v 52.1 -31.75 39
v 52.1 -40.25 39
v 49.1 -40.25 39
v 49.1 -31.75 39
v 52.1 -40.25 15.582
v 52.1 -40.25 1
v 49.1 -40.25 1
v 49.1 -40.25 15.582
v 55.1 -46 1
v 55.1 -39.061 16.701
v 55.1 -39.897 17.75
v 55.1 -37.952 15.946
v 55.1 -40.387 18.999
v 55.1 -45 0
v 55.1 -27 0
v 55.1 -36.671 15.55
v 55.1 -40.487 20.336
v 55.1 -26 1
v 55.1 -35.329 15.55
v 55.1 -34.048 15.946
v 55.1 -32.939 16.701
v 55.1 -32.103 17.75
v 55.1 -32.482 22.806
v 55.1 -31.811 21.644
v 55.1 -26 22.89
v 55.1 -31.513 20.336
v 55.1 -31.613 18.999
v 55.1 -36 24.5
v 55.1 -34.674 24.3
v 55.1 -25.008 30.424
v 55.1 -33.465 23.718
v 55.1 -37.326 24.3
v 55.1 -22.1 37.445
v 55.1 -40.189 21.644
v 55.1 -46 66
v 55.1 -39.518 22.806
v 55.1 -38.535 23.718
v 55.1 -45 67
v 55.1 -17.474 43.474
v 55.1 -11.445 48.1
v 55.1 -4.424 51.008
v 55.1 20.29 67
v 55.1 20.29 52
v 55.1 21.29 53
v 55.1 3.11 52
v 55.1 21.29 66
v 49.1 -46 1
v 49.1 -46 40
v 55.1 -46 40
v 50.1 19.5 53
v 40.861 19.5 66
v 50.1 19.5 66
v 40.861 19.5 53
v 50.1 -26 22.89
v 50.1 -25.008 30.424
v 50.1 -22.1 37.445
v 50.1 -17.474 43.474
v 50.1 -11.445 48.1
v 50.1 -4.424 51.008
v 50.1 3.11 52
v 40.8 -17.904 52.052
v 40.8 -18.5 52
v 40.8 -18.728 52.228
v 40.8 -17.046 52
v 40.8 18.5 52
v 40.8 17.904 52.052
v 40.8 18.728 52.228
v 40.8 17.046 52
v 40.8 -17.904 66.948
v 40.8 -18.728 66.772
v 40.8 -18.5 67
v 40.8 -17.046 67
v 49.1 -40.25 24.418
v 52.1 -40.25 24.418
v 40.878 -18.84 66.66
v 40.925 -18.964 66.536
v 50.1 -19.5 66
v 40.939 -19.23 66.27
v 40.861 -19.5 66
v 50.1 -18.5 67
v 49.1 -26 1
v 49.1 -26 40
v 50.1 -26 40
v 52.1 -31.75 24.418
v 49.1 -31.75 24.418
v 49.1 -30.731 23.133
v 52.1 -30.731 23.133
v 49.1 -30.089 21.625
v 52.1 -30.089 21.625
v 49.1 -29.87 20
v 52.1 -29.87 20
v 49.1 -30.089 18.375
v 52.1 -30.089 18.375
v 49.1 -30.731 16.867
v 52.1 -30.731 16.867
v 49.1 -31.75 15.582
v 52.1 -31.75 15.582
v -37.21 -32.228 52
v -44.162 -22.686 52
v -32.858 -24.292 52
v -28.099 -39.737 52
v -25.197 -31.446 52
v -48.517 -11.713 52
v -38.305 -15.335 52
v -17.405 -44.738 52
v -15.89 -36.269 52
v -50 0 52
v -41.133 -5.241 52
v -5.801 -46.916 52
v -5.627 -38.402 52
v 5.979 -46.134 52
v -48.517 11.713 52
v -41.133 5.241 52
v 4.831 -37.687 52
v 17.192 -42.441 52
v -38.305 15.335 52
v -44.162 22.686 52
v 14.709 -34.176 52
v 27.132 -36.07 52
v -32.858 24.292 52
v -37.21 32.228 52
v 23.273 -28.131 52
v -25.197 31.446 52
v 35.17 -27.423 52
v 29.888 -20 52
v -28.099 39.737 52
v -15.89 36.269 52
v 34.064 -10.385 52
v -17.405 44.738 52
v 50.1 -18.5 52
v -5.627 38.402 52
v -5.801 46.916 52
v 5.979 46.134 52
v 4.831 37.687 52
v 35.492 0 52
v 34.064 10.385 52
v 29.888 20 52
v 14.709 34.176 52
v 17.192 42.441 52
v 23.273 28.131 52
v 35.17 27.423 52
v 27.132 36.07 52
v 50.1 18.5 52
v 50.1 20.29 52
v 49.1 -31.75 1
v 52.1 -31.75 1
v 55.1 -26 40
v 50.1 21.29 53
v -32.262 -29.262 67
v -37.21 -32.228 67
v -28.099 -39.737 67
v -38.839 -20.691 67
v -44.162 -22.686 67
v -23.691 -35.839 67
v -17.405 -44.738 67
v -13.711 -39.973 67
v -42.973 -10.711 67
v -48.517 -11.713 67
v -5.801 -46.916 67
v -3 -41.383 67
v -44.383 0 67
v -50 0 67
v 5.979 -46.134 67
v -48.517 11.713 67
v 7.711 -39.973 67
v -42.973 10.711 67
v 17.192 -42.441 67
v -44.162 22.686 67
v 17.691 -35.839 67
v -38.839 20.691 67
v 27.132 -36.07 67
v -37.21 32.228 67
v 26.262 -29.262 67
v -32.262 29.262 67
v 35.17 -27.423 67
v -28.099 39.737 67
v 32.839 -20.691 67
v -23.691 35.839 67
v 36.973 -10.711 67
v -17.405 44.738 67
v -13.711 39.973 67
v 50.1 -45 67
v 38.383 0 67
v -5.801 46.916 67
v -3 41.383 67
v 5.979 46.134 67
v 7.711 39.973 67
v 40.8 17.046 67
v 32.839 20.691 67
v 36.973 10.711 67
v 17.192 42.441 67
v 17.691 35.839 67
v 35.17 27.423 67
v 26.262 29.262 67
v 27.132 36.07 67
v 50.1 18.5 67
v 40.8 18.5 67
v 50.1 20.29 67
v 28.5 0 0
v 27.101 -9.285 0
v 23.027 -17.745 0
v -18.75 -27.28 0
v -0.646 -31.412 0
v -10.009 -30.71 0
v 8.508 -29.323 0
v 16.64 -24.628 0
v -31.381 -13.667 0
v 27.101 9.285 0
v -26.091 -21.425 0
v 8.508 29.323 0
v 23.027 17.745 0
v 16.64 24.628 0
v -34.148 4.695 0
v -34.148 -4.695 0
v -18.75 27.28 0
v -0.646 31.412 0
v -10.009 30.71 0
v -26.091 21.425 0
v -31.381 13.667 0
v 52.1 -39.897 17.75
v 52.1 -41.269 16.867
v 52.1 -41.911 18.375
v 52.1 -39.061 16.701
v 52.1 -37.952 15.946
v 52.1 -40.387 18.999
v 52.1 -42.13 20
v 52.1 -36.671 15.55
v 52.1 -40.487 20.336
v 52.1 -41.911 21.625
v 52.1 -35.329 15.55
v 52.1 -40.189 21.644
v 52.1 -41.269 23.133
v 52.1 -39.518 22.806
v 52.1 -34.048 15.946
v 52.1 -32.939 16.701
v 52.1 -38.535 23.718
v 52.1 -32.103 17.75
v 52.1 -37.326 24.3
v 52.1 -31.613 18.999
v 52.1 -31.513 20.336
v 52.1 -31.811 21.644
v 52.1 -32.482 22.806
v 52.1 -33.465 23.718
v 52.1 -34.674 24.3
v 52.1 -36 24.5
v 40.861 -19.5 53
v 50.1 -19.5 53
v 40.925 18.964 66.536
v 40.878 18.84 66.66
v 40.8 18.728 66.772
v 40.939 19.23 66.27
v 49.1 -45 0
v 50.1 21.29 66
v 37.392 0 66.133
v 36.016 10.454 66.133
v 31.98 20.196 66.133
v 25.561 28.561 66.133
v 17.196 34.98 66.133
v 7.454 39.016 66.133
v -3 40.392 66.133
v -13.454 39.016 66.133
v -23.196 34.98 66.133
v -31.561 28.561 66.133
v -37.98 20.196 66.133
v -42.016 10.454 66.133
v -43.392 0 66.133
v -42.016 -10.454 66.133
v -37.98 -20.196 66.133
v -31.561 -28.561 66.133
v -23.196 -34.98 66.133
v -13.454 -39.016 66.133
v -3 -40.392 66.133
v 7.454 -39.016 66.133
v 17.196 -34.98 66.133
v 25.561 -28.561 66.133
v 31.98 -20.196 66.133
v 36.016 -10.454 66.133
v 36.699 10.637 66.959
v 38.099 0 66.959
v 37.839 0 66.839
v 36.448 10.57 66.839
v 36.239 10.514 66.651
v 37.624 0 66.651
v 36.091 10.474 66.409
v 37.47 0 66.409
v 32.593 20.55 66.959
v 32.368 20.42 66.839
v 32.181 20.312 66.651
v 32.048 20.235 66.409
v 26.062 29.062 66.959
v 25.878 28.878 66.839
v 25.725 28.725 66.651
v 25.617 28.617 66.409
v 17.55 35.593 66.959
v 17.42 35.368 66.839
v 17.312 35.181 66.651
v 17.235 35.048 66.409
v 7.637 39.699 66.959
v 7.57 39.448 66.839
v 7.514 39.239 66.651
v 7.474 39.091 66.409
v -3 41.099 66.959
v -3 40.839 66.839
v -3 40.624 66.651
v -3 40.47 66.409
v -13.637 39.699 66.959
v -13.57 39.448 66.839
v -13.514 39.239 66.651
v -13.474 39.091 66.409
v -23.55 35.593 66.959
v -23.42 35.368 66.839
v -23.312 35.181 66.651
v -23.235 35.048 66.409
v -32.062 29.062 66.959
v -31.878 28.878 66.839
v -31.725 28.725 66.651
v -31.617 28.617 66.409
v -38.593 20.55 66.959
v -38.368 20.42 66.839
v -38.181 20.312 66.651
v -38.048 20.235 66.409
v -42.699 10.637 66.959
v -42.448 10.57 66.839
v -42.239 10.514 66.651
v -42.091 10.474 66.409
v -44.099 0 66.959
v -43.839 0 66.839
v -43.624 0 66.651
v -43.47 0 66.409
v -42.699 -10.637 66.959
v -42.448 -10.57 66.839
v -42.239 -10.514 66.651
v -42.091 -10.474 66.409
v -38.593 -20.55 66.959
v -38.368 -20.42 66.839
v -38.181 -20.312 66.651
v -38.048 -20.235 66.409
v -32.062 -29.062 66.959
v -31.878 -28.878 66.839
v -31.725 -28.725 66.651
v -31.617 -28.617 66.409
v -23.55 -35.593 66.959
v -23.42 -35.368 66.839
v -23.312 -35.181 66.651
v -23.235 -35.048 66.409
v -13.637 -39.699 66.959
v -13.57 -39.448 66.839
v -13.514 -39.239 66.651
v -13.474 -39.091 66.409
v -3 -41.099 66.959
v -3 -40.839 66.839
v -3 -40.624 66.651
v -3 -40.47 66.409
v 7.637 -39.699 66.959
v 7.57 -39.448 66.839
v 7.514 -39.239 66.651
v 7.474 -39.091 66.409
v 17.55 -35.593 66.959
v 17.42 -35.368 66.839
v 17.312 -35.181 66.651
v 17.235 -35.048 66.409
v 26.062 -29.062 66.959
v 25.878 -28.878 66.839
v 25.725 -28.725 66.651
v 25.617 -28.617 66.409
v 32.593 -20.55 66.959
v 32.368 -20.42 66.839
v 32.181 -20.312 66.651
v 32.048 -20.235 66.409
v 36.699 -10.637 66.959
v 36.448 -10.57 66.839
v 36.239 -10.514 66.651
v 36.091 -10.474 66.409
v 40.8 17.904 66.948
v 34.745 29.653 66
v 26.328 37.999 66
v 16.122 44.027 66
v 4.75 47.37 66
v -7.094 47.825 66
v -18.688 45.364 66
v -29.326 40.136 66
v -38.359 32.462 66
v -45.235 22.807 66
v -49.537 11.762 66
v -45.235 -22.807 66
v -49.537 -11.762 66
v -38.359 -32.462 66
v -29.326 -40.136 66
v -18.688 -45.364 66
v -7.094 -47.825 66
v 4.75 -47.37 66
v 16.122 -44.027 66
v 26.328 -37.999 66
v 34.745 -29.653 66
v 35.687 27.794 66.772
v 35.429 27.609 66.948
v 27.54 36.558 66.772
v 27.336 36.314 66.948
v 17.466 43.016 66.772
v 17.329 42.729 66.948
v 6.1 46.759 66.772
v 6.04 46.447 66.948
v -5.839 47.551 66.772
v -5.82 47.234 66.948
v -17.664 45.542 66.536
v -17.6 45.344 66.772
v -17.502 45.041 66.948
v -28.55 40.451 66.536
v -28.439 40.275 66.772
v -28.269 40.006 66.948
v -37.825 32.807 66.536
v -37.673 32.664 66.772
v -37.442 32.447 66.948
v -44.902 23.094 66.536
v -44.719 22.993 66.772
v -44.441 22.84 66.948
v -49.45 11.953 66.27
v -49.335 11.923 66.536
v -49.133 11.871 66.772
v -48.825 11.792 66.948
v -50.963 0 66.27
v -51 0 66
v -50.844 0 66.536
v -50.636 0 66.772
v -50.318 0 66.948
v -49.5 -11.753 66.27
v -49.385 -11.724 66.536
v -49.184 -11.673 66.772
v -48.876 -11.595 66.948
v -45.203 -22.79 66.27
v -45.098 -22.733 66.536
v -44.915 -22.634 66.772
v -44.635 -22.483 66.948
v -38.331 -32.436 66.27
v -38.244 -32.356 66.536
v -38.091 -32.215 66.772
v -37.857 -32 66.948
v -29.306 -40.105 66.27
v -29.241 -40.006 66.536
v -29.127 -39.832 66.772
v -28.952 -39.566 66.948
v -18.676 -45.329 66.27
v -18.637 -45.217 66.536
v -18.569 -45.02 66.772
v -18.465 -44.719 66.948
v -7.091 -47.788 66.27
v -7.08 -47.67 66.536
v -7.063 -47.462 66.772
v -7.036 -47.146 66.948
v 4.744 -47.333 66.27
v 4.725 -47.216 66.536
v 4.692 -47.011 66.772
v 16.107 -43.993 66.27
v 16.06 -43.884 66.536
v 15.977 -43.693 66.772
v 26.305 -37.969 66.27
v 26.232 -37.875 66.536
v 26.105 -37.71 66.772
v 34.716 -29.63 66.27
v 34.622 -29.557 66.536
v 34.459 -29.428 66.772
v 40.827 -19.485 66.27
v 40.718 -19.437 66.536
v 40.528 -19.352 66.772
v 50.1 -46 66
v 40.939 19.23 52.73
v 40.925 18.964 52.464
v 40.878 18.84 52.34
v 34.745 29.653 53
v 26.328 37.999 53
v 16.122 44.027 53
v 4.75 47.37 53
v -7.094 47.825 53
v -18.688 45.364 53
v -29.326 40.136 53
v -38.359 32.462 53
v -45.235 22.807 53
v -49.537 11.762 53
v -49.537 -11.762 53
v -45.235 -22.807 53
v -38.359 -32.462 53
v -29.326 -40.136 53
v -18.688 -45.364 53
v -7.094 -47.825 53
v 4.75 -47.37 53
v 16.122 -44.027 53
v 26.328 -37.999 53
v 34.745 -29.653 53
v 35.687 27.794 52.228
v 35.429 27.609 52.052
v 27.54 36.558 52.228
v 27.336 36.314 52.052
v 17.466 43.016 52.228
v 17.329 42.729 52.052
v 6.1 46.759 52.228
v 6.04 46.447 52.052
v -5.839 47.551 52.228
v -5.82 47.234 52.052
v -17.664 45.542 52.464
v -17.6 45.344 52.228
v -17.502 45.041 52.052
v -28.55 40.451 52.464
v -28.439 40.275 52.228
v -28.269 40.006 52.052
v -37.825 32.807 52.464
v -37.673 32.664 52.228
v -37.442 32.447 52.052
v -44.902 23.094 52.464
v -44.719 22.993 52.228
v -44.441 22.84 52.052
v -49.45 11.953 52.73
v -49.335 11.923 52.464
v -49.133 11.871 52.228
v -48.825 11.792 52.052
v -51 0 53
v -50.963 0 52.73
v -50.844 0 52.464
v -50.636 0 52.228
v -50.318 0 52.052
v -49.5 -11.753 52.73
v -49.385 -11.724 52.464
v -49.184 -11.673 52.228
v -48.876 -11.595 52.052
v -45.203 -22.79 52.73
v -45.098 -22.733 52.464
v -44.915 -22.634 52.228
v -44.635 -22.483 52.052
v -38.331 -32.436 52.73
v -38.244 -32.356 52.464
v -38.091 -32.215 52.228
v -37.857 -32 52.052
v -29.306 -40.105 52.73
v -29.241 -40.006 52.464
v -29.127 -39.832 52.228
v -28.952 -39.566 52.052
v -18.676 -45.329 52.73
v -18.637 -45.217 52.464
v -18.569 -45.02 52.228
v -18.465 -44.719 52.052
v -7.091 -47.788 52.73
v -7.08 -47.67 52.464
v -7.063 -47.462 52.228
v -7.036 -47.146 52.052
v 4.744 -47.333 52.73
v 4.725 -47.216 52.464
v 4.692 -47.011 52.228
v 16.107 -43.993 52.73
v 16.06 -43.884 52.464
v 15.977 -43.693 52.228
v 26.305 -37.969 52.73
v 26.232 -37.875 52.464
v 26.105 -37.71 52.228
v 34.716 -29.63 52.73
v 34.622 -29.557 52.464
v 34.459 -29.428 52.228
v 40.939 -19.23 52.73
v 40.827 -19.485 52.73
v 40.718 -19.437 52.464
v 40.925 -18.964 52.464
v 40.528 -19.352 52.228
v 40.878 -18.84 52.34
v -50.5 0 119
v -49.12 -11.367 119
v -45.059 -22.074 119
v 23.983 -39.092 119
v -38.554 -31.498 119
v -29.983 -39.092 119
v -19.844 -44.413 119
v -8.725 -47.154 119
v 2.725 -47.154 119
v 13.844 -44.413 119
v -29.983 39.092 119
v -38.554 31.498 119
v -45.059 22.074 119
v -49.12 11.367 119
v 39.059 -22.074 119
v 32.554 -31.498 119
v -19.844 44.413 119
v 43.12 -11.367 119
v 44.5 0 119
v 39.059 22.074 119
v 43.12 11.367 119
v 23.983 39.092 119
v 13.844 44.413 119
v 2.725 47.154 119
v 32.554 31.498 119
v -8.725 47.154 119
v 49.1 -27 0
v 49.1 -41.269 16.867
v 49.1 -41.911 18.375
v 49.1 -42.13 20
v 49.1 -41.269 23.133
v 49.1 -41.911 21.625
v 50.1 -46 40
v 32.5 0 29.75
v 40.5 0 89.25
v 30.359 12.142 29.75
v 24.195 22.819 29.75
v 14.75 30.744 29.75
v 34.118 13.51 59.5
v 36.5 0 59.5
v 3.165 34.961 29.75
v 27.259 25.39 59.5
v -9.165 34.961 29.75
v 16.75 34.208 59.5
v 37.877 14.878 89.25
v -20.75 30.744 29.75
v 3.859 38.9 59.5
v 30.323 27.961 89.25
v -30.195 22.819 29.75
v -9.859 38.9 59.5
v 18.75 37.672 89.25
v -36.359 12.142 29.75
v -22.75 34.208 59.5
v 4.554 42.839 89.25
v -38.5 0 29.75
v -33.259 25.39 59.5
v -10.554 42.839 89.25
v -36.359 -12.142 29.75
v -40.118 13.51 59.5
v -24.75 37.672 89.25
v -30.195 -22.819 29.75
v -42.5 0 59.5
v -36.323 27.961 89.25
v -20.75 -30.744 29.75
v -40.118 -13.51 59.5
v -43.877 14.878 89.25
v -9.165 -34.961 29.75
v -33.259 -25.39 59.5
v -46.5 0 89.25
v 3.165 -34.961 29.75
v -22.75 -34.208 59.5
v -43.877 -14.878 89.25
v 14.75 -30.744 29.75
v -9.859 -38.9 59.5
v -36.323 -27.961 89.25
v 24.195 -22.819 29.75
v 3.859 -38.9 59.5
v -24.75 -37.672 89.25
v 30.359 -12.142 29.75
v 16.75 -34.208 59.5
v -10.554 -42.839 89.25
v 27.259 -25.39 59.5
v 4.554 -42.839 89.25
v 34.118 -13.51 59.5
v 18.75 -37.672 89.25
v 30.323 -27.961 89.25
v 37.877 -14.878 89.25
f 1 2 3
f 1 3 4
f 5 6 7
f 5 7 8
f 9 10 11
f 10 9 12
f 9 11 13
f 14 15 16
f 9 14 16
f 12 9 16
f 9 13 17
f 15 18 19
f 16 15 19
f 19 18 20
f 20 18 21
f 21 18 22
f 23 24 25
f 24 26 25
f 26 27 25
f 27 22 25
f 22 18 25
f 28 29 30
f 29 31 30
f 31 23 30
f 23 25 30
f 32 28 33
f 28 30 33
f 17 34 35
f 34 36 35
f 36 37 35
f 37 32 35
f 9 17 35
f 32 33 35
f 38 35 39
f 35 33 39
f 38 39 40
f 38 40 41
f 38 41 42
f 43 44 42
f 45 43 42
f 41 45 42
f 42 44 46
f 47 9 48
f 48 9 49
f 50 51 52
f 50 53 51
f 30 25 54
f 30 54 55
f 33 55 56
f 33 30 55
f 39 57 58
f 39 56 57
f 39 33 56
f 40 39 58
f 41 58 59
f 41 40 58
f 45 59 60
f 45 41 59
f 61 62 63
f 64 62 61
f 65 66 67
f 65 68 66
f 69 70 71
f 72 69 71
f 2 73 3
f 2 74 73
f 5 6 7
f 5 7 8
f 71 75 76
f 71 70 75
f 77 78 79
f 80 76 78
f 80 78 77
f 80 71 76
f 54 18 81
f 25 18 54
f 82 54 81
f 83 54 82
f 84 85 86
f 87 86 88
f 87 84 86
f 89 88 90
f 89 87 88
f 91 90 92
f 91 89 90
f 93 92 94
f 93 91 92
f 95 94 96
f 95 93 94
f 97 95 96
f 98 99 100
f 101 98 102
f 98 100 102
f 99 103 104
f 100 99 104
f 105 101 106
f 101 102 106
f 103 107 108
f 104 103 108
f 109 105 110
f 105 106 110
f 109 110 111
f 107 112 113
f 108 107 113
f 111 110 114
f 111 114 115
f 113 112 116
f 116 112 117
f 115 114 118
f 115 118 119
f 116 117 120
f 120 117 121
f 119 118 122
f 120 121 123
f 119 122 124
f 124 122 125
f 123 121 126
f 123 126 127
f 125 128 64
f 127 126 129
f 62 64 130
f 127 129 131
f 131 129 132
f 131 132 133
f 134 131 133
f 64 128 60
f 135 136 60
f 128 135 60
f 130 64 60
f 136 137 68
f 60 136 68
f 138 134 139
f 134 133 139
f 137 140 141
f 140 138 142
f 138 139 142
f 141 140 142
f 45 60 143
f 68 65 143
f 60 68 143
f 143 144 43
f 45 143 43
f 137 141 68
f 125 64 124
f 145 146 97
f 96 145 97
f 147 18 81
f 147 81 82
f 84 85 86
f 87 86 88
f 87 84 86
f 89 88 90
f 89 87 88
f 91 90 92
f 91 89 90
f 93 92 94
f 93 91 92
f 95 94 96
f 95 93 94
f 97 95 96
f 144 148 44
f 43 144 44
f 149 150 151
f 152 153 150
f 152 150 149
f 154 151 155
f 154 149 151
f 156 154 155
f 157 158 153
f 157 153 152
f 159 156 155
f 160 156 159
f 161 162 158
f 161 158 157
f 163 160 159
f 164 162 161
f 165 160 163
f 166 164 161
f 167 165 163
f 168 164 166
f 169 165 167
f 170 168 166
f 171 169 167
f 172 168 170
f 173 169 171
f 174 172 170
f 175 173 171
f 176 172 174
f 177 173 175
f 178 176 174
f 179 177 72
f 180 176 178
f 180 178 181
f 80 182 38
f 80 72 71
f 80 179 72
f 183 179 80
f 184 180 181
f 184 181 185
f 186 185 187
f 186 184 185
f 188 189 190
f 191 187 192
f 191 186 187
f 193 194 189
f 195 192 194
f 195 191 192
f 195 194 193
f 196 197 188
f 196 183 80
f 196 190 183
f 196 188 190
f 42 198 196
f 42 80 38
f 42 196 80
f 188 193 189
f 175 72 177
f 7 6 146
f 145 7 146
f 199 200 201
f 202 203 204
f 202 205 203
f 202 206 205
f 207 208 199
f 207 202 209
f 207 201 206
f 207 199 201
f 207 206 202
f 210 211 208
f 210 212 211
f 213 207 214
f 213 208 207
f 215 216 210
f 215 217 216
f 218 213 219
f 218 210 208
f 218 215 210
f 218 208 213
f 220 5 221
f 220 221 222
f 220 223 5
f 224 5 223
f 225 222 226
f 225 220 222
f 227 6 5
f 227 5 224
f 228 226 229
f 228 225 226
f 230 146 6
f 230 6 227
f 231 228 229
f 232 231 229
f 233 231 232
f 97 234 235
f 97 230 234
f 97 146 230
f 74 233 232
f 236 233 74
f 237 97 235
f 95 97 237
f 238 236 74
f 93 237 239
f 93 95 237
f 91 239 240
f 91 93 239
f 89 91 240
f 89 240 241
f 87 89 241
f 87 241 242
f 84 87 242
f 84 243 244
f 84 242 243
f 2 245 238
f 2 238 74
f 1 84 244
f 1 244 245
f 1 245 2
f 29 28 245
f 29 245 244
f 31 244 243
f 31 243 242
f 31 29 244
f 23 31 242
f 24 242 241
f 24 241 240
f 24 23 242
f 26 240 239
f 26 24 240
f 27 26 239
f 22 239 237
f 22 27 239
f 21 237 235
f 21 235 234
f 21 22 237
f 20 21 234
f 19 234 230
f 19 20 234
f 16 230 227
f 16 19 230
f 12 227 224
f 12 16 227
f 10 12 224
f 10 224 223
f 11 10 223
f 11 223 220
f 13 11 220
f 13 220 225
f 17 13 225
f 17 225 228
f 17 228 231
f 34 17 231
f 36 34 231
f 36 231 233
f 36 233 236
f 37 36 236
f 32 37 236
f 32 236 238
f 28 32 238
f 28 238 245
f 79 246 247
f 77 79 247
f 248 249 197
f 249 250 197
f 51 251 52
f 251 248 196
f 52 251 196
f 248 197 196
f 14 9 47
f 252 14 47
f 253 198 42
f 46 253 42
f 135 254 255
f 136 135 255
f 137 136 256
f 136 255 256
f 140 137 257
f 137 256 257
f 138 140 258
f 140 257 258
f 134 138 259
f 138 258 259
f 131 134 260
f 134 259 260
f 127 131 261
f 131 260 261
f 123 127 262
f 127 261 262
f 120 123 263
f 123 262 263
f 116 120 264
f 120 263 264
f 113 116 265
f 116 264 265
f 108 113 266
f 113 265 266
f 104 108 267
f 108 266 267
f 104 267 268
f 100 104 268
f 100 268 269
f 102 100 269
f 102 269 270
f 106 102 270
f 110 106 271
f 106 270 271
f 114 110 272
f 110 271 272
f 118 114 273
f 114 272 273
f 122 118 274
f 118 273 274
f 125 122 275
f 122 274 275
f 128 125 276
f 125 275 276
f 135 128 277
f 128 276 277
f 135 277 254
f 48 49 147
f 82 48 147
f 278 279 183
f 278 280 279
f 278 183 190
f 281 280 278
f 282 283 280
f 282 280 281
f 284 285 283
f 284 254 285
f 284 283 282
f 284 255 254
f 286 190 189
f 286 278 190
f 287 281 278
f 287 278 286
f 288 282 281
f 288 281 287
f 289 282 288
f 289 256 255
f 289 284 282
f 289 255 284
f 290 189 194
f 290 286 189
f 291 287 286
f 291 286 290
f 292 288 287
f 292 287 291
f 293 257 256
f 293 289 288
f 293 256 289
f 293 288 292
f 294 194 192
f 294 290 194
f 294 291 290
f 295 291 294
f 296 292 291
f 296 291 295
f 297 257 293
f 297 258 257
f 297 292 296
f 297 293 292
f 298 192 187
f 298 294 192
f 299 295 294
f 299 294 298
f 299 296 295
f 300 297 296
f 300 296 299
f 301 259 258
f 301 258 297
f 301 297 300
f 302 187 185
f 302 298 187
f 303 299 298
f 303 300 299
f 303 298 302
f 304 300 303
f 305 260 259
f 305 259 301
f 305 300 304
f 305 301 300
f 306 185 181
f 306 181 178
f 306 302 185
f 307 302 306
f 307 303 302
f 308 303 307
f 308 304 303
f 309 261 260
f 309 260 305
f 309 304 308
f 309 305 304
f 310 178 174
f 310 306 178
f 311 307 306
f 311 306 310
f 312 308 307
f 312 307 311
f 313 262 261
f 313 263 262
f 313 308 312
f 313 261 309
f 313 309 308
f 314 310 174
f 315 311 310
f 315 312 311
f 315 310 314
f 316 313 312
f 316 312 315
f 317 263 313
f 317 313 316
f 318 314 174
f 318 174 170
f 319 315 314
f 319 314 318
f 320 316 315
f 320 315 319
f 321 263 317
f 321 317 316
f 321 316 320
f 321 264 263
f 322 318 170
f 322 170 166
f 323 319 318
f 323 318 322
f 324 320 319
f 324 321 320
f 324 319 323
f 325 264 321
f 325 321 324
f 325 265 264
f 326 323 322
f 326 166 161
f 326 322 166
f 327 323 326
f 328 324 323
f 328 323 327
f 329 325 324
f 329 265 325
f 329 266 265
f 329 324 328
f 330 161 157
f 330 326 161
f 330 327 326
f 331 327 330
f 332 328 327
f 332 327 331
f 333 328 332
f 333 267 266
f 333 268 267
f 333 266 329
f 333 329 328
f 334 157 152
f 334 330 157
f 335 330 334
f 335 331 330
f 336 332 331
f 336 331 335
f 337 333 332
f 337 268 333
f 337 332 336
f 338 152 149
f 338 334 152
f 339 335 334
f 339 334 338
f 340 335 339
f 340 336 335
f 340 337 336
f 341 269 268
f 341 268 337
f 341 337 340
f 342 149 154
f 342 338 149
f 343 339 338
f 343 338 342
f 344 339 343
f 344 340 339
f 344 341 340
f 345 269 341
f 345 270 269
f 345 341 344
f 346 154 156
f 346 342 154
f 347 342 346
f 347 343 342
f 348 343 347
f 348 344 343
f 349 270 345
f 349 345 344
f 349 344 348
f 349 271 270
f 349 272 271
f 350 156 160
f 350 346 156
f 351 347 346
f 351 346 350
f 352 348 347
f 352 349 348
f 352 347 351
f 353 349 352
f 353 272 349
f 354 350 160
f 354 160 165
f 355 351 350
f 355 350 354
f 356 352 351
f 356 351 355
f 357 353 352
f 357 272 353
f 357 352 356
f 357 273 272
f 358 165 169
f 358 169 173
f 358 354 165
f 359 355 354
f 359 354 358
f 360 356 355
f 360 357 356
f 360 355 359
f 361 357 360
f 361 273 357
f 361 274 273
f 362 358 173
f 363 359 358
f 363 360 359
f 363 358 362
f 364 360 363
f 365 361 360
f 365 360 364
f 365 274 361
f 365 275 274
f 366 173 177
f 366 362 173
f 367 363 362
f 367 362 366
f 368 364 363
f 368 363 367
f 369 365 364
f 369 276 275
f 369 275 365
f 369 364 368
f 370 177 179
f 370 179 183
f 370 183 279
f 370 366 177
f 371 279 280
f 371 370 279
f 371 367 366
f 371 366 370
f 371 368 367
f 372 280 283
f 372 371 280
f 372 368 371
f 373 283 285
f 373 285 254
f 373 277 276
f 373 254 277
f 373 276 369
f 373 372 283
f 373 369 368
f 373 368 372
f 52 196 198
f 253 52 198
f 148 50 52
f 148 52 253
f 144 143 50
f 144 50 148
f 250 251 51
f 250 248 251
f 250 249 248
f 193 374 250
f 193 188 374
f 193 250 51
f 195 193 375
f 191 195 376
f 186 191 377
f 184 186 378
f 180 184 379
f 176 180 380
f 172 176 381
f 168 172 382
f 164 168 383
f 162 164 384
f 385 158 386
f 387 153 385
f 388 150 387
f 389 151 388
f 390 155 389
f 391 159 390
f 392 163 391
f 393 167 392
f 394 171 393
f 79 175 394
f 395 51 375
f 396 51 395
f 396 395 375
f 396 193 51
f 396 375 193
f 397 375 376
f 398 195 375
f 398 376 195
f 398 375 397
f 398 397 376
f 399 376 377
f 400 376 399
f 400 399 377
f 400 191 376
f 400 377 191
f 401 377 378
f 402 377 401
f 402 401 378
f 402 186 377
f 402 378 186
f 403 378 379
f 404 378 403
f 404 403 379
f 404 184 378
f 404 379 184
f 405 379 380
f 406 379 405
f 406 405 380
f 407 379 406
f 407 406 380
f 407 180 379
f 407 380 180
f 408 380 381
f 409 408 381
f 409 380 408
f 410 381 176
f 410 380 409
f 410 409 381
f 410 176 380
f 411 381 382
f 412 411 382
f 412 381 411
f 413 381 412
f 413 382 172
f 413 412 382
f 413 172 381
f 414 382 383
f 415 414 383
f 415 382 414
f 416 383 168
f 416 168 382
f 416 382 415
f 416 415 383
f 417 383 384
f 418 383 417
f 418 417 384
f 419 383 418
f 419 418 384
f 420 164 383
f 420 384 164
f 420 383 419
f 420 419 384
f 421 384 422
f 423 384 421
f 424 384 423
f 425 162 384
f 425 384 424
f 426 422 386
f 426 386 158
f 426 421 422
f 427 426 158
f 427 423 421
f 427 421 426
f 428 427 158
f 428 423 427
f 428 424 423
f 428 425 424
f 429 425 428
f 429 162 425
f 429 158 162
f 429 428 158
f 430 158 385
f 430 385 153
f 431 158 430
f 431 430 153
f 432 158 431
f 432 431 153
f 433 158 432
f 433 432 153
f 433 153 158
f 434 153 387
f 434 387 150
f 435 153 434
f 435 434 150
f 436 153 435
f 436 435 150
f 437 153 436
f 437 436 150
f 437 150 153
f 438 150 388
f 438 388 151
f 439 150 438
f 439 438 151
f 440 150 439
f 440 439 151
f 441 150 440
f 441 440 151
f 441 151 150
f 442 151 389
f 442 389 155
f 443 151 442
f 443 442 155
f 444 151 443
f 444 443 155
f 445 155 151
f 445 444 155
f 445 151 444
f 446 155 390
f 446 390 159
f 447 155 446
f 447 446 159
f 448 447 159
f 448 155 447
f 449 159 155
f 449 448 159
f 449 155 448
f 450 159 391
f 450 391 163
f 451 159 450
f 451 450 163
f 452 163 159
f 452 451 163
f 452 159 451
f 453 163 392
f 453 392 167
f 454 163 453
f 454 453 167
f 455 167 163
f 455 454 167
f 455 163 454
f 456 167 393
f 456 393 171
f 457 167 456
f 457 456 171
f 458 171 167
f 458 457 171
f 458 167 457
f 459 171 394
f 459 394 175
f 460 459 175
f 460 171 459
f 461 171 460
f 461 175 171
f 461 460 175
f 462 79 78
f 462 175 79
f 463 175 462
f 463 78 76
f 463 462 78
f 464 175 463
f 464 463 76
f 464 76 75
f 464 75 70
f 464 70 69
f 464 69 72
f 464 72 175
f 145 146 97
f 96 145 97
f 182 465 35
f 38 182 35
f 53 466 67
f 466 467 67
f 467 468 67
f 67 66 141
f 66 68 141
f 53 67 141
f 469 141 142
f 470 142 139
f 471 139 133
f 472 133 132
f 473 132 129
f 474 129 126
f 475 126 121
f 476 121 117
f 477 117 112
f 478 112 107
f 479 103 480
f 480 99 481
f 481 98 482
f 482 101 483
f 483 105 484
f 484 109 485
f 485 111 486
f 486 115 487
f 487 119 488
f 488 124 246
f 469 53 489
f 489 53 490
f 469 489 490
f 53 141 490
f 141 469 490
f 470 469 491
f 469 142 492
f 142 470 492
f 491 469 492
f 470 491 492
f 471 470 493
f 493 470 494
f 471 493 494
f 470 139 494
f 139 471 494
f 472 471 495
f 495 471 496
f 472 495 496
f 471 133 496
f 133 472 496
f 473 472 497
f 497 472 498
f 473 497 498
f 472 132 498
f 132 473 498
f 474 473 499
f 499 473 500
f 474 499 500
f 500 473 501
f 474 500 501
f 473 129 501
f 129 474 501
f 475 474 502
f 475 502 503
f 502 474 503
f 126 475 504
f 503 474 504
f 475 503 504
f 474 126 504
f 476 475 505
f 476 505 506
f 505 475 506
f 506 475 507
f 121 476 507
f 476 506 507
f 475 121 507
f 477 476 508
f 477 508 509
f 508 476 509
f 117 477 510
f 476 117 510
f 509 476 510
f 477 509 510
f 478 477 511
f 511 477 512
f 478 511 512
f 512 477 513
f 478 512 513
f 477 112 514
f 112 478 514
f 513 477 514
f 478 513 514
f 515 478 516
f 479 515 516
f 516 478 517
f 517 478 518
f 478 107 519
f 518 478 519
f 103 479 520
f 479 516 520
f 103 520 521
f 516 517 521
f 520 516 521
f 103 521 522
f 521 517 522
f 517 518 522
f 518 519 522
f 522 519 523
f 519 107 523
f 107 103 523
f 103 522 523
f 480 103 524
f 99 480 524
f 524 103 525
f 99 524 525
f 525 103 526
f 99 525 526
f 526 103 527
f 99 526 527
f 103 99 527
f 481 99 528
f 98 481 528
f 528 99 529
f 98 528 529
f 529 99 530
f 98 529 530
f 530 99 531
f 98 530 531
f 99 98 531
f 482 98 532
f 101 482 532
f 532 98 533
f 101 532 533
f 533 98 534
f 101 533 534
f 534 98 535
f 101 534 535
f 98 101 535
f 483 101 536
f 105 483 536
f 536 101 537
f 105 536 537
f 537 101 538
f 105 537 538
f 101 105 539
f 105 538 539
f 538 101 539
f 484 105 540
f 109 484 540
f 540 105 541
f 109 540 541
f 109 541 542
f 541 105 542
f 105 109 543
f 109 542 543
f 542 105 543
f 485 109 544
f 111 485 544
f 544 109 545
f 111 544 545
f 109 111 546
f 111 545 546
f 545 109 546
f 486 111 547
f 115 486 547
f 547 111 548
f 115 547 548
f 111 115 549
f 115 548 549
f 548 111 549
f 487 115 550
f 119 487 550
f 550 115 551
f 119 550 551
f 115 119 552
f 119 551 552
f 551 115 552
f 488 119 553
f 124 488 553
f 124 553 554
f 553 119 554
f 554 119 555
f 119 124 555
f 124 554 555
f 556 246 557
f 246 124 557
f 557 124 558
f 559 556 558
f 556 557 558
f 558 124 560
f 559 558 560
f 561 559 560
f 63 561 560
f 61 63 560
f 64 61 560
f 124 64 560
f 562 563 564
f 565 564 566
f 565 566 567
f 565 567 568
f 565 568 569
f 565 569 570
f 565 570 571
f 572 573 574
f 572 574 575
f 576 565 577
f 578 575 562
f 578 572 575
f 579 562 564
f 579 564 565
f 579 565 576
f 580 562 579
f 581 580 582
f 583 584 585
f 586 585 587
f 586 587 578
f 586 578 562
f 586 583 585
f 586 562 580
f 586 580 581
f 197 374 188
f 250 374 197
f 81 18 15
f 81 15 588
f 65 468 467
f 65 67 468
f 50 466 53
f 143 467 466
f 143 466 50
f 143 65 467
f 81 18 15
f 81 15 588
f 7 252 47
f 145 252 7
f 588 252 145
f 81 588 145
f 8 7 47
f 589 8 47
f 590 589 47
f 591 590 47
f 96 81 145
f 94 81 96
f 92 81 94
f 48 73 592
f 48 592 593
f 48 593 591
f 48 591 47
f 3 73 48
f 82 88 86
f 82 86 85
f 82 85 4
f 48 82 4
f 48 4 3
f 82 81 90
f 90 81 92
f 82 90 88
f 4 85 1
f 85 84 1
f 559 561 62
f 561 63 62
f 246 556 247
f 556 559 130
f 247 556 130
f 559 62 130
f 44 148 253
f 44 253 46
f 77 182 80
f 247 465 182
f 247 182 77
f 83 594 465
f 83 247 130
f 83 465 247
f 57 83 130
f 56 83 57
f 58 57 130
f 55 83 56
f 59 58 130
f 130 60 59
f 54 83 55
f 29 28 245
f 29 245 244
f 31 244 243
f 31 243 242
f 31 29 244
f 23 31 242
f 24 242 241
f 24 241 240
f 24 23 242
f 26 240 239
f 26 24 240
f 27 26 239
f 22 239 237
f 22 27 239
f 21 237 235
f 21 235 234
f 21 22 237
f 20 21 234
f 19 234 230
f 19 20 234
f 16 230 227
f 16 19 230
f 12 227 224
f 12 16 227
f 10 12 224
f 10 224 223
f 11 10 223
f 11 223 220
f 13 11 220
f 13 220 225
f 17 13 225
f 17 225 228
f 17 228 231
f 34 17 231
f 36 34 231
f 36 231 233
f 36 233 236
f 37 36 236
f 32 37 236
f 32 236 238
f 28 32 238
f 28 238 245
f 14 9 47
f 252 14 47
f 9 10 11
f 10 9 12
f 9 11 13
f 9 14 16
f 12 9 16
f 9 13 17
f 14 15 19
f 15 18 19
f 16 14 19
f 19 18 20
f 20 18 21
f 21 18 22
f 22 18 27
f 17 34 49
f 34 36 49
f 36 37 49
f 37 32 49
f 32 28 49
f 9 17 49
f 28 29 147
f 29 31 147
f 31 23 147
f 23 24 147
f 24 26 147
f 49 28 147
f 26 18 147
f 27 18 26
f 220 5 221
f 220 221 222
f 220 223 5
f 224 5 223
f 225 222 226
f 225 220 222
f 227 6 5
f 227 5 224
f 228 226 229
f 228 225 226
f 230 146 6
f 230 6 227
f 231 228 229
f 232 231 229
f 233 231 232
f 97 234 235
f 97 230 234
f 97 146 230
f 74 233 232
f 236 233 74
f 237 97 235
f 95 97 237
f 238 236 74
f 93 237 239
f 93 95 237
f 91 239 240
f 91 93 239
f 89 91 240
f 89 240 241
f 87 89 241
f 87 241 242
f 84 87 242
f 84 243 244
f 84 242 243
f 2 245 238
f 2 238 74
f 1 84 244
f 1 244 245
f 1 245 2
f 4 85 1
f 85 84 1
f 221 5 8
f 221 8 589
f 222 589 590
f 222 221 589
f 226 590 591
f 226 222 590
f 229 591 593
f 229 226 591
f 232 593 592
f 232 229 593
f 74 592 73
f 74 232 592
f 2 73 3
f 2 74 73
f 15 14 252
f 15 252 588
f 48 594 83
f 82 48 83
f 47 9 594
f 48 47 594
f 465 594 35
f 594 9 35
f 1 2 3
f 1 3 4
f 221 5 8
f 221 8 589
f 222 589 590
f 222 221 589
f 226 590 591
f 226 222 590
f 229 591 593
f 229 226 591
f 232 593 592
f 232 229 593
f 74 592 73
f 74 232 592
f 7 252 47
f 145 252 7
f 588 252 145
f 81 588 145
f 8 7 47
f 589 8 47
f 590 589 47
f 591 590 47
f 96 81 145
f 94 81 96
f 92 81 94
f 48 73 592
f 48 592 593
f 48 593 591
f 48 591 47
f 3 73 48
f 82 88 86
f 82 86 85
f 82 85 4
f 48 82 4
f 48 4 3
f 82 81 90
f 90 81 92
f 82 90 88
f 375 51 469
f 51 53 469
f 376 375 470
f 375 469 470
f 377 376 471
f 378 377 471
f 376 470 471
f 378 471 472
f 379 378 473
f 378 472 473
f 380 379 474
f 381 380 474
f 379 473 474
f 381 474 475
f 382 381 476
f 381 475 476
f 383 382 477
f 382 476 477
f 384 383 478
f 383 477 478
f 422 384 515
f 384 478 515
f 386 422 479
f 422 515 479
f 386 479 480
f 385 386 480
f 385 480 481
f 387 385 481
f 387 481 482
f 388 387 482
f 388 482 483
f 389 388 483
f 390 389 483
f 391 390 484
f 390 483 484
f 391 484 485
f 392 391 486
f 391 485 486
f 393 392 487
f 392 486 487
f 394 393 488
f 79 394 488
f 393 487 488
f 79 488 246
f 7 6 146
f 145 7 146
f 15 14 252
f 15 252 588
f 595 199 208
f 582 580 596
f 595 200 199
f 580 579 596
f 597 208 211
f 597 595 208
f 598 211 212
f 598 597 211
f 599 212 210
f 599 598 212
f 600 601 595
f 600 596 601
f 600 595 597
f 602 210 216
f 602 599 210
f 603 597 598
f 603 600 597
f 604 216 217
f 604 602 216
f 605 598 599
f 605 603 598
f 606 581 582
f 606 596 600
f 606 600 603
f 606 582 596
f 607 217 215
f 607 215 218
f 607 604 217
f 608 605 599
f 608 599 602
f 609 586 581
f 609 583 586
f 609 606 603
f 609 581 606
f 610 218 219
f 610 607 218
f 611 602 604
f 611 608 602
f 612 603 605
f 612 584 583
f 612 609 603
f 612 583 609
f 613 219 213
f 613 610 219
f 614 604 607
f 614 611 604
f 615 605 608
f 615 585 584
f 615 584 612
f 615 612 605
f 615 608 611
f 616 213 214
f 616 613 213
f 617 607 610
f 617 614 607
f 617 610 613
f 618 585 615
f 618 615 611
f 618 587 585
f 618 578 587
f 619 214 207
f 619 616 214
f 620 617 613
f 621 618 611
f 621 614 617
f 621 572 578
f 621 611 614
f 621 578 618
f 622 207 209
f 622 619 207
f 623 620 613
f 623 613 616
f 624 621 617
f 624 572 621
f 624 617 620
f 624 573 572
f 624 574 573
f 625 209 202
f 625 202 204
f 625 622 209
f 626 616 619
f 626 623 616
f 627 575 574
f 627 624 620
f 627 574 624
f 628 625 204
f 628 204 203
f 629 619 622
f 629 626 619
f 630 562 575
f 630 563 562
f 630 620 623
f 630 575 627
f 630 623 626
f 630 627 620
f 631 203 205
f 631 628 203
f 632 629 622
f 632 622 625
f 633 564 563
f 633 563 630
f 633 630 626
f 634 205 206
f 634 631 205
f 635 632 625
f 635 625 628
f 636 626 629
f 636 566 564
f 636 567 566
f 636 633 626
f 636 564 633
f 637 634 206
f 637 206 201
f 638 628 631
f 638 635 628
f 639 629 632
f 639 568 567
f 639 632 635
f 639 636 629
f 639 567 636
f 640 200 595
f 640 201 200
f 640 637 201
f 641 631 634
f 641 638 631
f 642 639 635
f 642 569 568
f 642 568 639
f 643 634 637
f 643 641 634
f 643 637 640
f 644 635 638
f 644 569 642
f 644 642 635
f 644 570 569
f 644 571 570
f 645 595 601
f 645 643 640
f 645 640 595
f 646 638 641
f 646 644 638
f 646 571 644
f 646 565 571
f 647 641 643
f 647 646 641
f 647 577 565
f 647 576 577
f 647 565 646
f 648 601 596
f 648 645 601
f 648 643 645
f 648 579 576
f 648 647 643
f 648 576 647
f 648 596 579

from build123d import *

# Parameters (mm, degrees)
BOX008_W               = 38
BOX008_H               = 8.5
BOX008_DEPTH           = 10
CYLINDER003_R          = 6.13
CYLINDER003_DEPTH      = 10
CYLINDER002_R          = 4.5
CYLINDER002_DEPTH      = 10
BOX007_W               = 40
BOX007_H               = 20
BOX007_DEPTH           = 6
CUT009_PLACEMENT_ANGLE = 90
CHAMFER005_SIZE        = 1
BOX005_W               = 38
BOX005_H               = 8.5
BOX005_DEPTH           = 10
CYLINDER001_R          = 6.13
CYLINDER001_DEPTH      = 10
CYLINDER_R             = 4.5
CYLINDER_DEPTH         = 10
BOX004_W               = 40
BOX004_H               = 20
BOX004_DEPTH           = 6
CUT005_PLACEMENT_ANGLE = 90
CHAMFER_SIZE           = 1
TUBE_R                 = 48
TUBE_R_2               = 38
TUBE_DEPTH             = 15
FILLET_R               = 1
BOX003_W               = 10.4
BOX003_H               = 58.22
BOX003_DEPTH           = 52
FILLET001_R            = 29.11
BOX002_W               = 6
BOX002_H               = 20
BOX002_DEPTH           = 40
BOX_W                  = 5
BOX_H                  = 67.29
BOX_DEPTH              = 67
CHAMFER004_SIZE        = 1
BOX006_W               = 9.3
BOX006_H               = 39
BOX006_DEPTH           = 15
CHAMFER003_SIZE        = 1


with BuildPart() as cup:
    # Cone001 → Cone001 (revolve)
    with BuildSketch(Plane(origin=(-3, 0, 0), x_dir=(1, 0, 0), z_dir=(0, -1, 0))):
        Polygon((0, 0), (31.5, 0), (47.5, 119), (0, 119), align=None)
    revolve(axis=Axis((-3, 0, 0), (0, 0, 1)))


with BuildPart() as cube008:
    # Box008 → Box008 (new body)
    with BuildSketch(Plane(origin=(-19, -4.25, 3), x_dir=(1, 0, 0), z_dir=(0, 0, 1))):
        with Locations((19, 4.25)):
            Rectangle(BOX008_W, BOX008_H)
    extrude(amount=BOX008_DEPTH)


with BuildPart() as cylinder003:
    # Cylinder003 → Cylinder003 (new body)
    with BuildSketch(Plane.XY.offset(3)):
        Circle(CYLINDER003_R)
    extrude(amount=CYLINDER003_DEPTH)


with BuildPart() as cylinder002:
    # Cylinder002 → Cylinder002 (new body)
    with BuildSketch(Plane.XY):
        Circle(CYLINDER002_R)
    extrude(amount=CYLINDER002_DEPTH)


with BuildPart() as servo_mount_standalone:
    # Box007 → Box007 (new body)
    with BuildSketch(Plane(origin=(-20, -10, 0), x_dir=(1, 0, 0), z_dir=(0, 0, 1))):
        with Locations((20, 10)):
            Rectangle(BOX007_W, BOX007_H)
    extrude(amount=BOX007_DEPTH)

    # Cut007: cut Cylinder002
    add(cylinder002.part, mode=Mode.SUBTRACT)

    # Cut008: cut Cylinder003
    add(cylinder003.part, mode=Mode.SUBTRACT)

    # Cut009: cut Cube008
    add(cube008.part, mode=Mode.SUBTRACT)


with BuildPart() as servo_mount_standalone_1:
    # Cut009 placement: moved
    add(servo_mount_standalone.part.moved(Location((55.1, -36, 20))).rotate(Axis((55.1, -36, 20), (0, -1, 0)), CUT009_PLACEMENT_ANGLE))

    # Chamfer005
    chamfer005_edges = [servo_mount_standalone_1.edges().sort_by_distance(p)[0] for p in [
        (52.1, -46, 0),
        (52.1, -26, 0),
    ]]
    chamfer(chamfer005_edges, length=CHAMFER005_SIZE)


with BuildPart() as cube005:
    # Box005 → Box005 (new body)
    with BuildSketch(Plane(origin=(-19, -4.25, 3), x_dir=(1, 0, 0), z_dir=(0, 0, 1))):
        with Locations((19, 4.25)):
            Rectangle(BOX005_W, BOX005_H)
    extrude(amount=BOX005_DEPTH)


with BuildPart() as cylinder001:
    # Cylinder001 → Cylinder001 (new body)
    with BuildSketch(Plane.XY.offset(3)):
        Circle(CYLINDER001_R)
    extrude(amount=CYLINDER001_DEPTH)


with BuildPart() as cylinder:
    # Cylinder → Cylinder (new body)
    with BuildSketch(Plane.XY):
        Circle(CYLINDER_R)
    extrude(amount=CYLINDER_DEPTH)


with BuildPart() as servo_mount:
    # Box004 → Box004 (new body)
    with BuildSketch(Plane(origin=(-20, -10, 0), x_dir=(1, 0, 0), z_dir=(0, 0, 1))):
        with Locations((20, 10)):
            Rectangle(BOX004_W, BOX004_H)
    extrude(amount=BOX004_DEPTH)

    # Cut003: cut Cylinder
    add(cylinder.part, mode=Mode.SUBTRACT)

    # Cut004: cut Cylinder001
    add(cylinder001.part, mode=Mode.SUBTRACT)

    # Cut005: cut Cube005
    add(cube005.part, mode=Mode.SUBTRACT)


with BuildPart() as servo_mount_1:
    # Cut005 placement: moved
    add(servo_mount.part.moved(Location((55.1, -36, 20))).rotate(Axis((55.1, -36, 20), (0, -1, 0)), CUT005_PLACEMENT_ANGLE))

    # Chamfer
    chamfer_edges = [servo_mount_1.edges().sort_by_distance(p)[0] for p in [
        (52.1, -46, 0),
        (52.1, -26, 0),
    ]]
    chamfer(chamfer_edges, length=CHAMFER_SIZE)


with BuildPart() as cup_mold:
    # Cone → Cone (revolve)
    with BuildSketch(Plane.XZ):
        Polygon((0, 0), (31.5, 0), (47.5, 119), (0, 119), align=None)
    revolve(axis=Axis((0, 0, 0), (0, 0, 1)))


with BuildPart() as rounded_holder:
    # Tube → Tube (new body)
    with BuildSketch(Plane.XY.offset(52)):
        Circle(TUBE_R)
        Circle(TUBE_R_2, mode=Mode.SUBTRACT)
    extrude(amount=TUBE_DEPTH)

    # Cut: cut Cup Mold
    add(cup_mold.part, mode=Mode.SUBTRACT)

    # Fillet
    fillet_edges = [rounded_holder.edges().sort_by_distance(p)[0] for p in [
        (-48, 0, 67),
        (-48, 0, 52),
        (-40.508403, 0, 67),
    ]]
    fillet(fillet_edges, radius=FILLET_R)


with BuildPart() as rounded_holder_1:
    # Fillet placement: moved
    add(rounded_holder.part.moved(Location((-3, 0, 0))))


with BuildPart() as fillet001:
    # Box003 → Box003 (new body)
    with BuildSketch(Plane(origin=(45.7, -26, 0), x_dir=(1, 0, 0), z_dir=(0, 0, 1))):
        with Locations((5.2, 29.11)):
            Rectangle(BOX003_W, BOX003_H)
    extrude(amount=BOX003_DEPTH)

    # Fillet001
    fillet001_edges = [fillet001.edges().sort_by_distance(p)[0] for p in [
        (50.9, -26, 52),
    ]]
    fillet(fillet001_edges, radius=FILLET001_R)


with BuildPart() as cube002:
    # Box002 → Box002 (new body)
    with BuildSketch(Plane(origin=(50.1, -46, 0), x_dir=(1, 0, 0), z_dir=(0, 0, 1))):
        with Locations((3, 10)):
            Rectangle(BOX002_W, BOX002_H)
    extrude(amount=BOX002_DEPTH)


with BuildPart() as chamfer004:
    # Box → Box (new body)
    with BuildSketch(Plane(origin=(50.1, -46, 0), x_dir=(1, 0, 0), z_dir=(0, 0, 1))):
        with Locations((2.5, 33.645)):
            Rectangle(BOX_W, BOX_H)
    extrude(amount=BOX_DEPTH)

    # Cut001: cut Cube002
    add(cube002.part, mode=Mode.SUBTRACT)

    # Cut006: cut Fillet001
    add(fillet001.part, mode=Mode.SUBTRACT)

    # Chamfer004
    chamfer004_edges = [chamfer004.edges().sort_by_distance(p)[0] for p in [
        (52.6, -46, 67),
        (52.6, 21.29, 67),
        (52.6, 21.29, 52),
    ]]
    chamfer(chamfer004_edges, length=CHAMFER004_SIZE)


with BuildPart() as complete_cup_holder:
    # Box006 → Box006 (new body)
    with BuildSketch(Plane(origin=(40.8, -19.5, 52), x_dir=(1, 0, 0), z_dir=(0, 0, 1))):
        with Locations((4.65, 19.5)):
            Rectangle(BOX006_W, BOX006_H)
    extrude(amount=BOX006_DEPTH)

    # Chamfer003
    chamfer003_edges = [complete_cup_holder.edges().sort_by_distance(p)[0] for p in [
        (45.45, -19.5, 52),
        (45.45, -19.5, 67),
        (45.45, 19.5, 52),
        (45.45, 19.5, 67),
    ]]
    chamfer(chamfer003_edges, length=CHAMFER003_SIZE)

    # Fusion: union Rounded Holder, Chamfer004
    add(rounded_holder_1.part)
    add(chamfer004.part)

    # Fusion001: union Servo Mount
    add(servo_mount_1.part)


solid = Compound([cup.part, servo_mount_standalone_1.part, complete_cup_holder.part])
